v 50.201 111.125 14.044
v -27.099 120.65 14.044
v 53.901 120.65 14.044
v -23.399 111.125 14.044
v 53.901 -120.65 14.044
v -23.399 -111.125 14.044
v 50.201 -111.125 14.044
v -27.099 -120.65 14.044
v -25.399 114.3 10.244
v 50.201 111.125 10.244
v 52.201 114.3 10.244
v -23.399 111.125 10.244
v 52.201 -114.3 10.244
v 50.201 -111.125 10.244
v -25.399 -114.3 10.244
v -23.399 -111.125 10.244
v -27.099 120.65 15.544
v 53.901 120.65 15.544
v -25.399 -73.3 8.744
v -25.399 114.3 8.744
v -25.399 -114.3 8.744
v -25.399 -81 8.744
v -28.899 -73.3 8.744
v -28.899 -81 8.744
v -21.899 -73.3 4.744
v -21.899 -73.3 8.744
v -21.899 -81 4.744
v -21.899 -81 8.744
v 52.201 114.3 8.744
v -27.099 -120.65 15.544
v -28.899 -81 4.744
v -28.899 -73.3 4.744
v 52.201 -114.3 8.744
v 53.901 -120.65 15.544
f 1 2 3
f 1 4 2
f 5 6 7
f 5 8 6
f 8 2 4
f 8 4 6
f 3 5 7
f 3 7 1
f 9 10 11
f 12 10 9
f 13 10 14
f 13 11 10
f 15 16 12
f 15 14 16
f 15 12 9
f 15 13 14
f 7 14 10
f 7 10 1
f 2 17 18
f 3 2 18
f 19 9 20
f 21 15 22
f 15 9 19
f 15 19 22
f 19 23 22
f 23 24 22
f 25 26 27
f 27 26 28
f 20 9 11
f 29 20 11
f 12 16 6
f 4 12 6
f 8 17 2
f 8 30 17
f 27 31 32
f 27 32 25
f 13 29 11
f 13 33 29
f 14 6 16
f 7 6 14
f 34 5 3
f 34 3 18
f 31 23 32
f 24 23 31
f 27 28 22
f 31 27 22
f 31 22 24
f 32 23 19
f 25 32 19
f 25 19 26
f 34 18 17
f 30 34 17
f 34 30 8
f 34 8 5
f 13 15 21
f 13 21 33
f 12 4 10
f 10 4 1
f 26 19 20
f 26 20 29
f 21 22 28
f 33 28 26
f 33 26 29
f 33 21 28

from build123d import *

# Parameters (mm, degrees)
F1_DEPTH = 114.3
F2_DEPTH = 120.65
F0_W     = 36.8
F0_H     = 3.8
F3_DEPTH = 111.125
F4_W     = 3.5
F4_H     = 7.7
F5_DEPTH = 4


with BuildPart() as f1:
    # F0 (on Front) → F1 (new body, symmetric)
    with BuildSketch(Plane.XZ):
        Polygon((50.201469934, 10.2439912885), (13.401469934, 10.2439912885), (13.401469934, 8.7439912885), (52.201469934, 8.7439912885), (52.201469934, 10.2439912885), align=None)
        Polygon((13.401469934, 8.7439912885), (13.401469934, 10.2439912885), (-23.398530066, 10.2439912885), (-25.398530066, 10.2439912885), (-25.398530066, 8.7439912885), align=None)
    extrude(amount=F1_DEPTH, both=True)



with BuildPart() as f2:
    # F0 (on Front) → F2 (new body, symmetric)
    with BuildSketch(Plane.XZ):
        Polygon((13.401469934, 15.5439912885), (-27.098530066, 15.5439912885), (-27.098530066, 14.0439912885), (-23.398530066, 14.0439912885), (13.401469934, 14.0439912885), align=None)
        Polygon((53.901469934, 15.5439912885), (13.401469934, 15.5439912885), (13.401469934, 14.0439912885), (50.201469934, 14.0439912885), (53.901469934, 14.0439912885), align=None)
    extrude(amount=F2_DEPTH, both=True)


with BuildPart() as f1_1:
    add(f1.part)

    add(f2.part)  # F3 merges F2
    # F0 (on Front) → F3 (join, symmetric)
    with BuildSketch(Plane.XZ):
        with Locations((-4.998530066, 12.1439912885)):
            Rectangle(F0_W, F0_H)
        with Locations((31.801469934, 12.1439912885)):
            Rectangle(F0_W, F0_H)
    extrude(amount=F3_DEPTH, both=True)

    # F4 (on face) → F5 (join)
    with BuildSketch(Plane(origin=(0, 0, 8.7439912885), x_dir=(1, 0, 0), z_dir=(0, 0, -1))):
        with Locations((-23.648530066, 77.15)):
            Rectangle(F4_W, F4_H)
        with Locations((-27.148530066, 77.15)):
            Rectangle(F4_W, F4_H)
    extrude(amount=F5_DEPTH)


solid = f1_1.part
